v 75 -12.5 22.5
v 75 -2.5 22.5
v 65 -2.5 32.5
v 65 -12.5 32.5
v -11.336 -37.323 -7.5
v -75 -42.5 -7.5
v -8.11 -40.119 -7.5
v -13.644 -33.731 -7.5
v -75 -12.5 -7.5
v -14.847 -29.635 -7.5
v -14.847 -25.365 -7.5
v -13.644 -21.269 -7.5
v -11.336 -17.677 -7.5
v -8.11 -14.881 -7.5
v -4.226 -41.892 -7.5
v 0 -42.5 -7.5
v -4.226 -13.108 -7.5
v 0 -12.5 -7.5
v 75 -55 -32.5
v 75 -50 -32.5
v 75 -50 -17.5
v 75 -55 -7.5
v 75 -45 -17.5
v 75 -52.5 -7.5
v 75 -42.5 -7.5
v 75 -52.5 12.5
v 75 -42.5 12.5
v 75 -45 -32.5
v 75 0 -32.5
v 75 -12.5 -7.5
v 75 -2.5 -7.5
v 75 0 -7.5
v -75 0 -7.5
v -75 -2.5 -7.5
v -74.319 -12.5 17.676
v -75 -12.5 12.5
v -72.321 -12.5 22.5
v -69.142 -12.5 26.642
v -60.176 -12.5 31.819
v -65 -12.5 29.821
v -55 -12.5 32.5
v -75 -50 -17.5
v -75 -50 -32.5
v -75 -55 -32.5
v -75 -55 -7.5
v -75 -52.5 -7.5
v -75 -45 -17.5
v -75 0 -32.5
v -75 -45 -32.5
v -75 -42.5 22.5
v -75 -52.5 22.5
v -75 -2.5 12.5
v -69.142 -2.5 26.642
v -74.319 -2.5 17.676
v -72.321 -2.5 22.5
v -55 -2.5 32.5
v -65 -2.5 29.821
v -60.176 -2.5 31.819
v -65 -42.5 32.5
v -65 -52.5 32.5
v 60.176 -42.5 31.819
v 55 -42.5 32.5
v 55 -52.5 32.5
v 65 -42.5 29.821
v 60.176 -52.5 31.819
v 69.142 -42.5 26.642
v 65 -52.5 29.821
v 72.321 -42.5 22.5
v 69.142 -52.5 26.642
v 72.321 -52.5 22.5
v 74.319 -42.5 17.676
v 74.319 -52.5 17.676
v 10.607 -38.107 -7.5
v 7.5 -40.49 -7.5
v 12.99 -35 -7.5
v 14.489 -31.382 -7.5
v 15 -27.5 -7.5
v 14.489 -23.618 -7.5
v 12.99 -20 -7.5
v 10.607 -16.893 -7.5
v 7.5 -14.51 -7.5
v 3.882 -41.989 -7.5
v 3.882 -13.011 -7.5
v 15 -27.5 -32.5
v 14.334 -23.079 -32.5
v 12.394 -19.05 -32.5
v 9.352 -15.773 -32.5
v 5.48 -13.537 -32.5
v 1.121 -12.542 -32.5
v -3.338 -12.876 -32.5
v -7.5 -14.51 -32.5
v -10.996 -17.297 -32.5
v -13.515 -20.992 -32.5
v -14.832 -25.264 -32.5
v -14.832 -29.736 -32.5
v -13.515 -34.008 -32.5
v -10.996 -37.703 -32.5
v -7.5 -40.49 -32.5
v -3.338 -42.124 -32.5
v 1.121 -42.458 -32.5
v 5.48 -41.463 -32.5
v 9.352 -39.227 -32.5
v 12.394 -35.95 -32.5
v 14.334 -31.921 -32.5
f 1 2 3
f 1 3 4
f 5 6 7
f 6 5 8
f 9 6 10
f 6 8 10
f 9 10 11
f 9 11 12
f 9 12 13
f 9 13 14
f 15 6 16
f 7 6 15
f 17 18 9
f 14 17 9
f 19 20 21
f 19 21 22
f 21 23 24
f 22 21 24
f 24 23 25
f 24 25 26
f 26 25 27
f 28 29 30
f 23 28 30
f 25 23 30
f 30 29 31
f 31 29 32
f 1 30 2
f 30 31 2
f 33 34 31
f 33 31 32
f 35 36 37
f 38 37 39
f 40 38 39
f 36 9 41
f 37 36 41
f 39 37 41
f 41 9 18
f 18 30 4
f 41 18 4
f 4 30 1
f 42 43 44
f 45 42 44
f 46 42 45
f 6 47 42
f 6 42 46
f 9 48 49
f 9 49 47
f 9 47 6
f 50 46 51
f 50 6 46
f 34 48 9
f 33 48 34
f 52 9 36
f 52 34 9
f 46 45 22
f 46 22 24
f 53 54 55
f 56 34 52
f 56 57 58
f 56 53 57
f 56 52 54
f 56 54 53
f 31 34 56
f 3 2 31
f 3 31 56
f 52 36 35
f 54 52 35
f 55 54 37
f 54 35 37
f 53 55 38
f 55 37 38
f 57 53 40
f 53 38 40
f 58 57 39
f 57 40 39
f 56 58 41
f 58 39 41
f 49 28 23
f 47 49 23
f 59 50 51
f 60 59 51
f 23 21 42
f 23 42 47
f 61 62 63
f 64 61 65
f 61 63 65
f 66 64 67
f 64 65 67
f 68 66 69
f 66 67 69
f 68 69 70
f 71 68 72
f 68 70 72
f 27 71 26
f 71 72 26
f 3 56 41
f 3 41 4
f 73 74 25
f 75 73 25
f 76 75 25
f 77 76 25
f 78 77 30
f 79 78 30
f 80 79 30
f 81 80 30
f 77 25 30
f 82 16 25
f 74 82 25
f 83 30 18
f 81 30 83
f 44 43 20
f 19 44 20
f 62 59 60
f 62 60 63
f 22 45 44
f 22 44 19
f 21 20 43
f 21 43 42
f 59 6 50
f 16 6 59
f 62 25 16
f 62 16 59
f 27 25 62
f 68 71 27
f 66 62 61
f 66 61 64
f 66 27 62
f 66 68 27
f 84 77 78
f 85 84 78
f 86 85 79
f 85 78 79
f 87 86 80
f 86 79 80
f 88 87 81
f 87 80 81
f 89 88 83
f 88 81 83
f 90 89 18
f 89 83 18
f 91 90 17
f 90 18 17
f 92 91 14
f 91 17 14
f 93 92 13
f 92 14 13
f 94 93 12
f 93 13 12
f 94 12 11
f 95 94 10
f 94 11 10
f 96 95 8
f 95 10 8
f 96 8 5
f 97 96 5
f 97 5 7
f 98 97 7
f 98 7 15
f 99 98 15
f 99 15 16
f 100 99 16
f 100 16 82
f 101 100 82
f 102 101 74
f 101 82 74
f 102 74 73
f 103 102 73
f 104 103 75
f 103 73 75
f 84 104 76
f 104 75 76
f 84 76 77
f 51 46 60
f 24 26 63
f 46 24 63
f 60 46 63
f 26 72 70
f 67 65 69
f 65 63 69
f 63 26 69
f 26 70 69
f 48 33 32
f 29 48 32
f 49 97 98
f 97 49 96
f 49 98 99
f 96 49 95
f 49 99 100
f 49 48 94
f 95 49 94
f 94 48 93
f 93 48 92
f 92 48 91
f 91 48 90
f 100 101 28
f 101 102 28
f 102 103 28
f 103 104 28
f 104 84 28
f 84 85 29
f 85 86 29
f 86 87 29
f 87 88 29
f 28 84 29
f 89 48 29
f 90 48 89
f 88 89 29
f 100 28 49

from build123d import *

# Parameters (mm, degrees)
F0_W      = 150
F0_H      = 65
F1_DEPTH  = 55
F2_W      = 5
F2_H      = 15
F3_DEPTH  = 150.001
F4_W      = 30
F4_H      = 40
F5_DEPTH  = 150.001
F6_SIZE   = 10
F7_R      = 20
F8_W      = 2.5
F8_H      = 43.3062759042
F9_DEPTH  = 150.001
F10_W     = 2.5
F10_H     = 43.4678007662
F11_DEPTH = 150.001
F12_R     = 15
F13_DEPTH = 25.001


with BuildPart() as f1:
    # F0 (on Front) → F1 (new body)
    with BuildSketch(Plane.XZ):
        Rectangle(F0_W, F0_H)
    extrude(amount=F1_DEPTH)

    # F2 (on face) → F3 (cut, through all)
    with BuildSketch(Plane.YZ.offset(75)):
        with Locations((-47.5, -25)):
            Rectangle(F2_W, F2_H)
    extrude(amount=-F3_DEPTH, mode=Mode.SUBTRACT)

    # F4 (on face) → F5 (cut, through all)
    with BuildSketch(Plane.YZ.offset(75)):
        with Locations((-27.5, 12.5)):
            Rectangle(F4_W, F4_H)
    extrude(amount=-F5_DEPTH, mode=Mode.SUBTRACT)

    # F6
    f6_edges = [f1.edges().sort_by_distance(p)[0] for p in [
        (75, -6.25, 32.5),
        (-75, -48.75, 32.5),
    ]]
    chamfer(f6_edges, length=F6_SIZE)

    # F7
    f7_edges = [f1.edges().sort_by_distance(p)[0] for p in [
        (75, -48.75, 32.5),
        (-75, -6.25, 32.5),
    ]]
    fillet(f7_edges, radius=F7_R)

    # F8 (on face) → F9 (cut, through all)
    with BuildSketch(Plane.YZ.offset(75)):
        with Locations((-53.75, 14.1531379521)):
            Rectangle(F8_W, F8_H)
    extrude(amount=-F9_DEPTH, mode=Mode.SUBTRACT)

    # F10 (on face) → F11 (cut, through all)
    with BuildSketch(Plane.YZ.offset(75)):
        with Locations((-1.25, 14.2339003831)):
            Rectangle(F10_W, F10_H)
    extrude(amount=-F11_DEPTH, mode=Mode.SUBTRACT)

    # F12 (on face) → F13 (cut, through all)
    with BuildSketch(Plane.XY.offset(-7.5)):
        with Locations((0, -27.5)):
            Circle(F12_R)
    extrude(amount=-F13_DEPTH, mode=Mode.SUBTRACT)


solid = f1.part
